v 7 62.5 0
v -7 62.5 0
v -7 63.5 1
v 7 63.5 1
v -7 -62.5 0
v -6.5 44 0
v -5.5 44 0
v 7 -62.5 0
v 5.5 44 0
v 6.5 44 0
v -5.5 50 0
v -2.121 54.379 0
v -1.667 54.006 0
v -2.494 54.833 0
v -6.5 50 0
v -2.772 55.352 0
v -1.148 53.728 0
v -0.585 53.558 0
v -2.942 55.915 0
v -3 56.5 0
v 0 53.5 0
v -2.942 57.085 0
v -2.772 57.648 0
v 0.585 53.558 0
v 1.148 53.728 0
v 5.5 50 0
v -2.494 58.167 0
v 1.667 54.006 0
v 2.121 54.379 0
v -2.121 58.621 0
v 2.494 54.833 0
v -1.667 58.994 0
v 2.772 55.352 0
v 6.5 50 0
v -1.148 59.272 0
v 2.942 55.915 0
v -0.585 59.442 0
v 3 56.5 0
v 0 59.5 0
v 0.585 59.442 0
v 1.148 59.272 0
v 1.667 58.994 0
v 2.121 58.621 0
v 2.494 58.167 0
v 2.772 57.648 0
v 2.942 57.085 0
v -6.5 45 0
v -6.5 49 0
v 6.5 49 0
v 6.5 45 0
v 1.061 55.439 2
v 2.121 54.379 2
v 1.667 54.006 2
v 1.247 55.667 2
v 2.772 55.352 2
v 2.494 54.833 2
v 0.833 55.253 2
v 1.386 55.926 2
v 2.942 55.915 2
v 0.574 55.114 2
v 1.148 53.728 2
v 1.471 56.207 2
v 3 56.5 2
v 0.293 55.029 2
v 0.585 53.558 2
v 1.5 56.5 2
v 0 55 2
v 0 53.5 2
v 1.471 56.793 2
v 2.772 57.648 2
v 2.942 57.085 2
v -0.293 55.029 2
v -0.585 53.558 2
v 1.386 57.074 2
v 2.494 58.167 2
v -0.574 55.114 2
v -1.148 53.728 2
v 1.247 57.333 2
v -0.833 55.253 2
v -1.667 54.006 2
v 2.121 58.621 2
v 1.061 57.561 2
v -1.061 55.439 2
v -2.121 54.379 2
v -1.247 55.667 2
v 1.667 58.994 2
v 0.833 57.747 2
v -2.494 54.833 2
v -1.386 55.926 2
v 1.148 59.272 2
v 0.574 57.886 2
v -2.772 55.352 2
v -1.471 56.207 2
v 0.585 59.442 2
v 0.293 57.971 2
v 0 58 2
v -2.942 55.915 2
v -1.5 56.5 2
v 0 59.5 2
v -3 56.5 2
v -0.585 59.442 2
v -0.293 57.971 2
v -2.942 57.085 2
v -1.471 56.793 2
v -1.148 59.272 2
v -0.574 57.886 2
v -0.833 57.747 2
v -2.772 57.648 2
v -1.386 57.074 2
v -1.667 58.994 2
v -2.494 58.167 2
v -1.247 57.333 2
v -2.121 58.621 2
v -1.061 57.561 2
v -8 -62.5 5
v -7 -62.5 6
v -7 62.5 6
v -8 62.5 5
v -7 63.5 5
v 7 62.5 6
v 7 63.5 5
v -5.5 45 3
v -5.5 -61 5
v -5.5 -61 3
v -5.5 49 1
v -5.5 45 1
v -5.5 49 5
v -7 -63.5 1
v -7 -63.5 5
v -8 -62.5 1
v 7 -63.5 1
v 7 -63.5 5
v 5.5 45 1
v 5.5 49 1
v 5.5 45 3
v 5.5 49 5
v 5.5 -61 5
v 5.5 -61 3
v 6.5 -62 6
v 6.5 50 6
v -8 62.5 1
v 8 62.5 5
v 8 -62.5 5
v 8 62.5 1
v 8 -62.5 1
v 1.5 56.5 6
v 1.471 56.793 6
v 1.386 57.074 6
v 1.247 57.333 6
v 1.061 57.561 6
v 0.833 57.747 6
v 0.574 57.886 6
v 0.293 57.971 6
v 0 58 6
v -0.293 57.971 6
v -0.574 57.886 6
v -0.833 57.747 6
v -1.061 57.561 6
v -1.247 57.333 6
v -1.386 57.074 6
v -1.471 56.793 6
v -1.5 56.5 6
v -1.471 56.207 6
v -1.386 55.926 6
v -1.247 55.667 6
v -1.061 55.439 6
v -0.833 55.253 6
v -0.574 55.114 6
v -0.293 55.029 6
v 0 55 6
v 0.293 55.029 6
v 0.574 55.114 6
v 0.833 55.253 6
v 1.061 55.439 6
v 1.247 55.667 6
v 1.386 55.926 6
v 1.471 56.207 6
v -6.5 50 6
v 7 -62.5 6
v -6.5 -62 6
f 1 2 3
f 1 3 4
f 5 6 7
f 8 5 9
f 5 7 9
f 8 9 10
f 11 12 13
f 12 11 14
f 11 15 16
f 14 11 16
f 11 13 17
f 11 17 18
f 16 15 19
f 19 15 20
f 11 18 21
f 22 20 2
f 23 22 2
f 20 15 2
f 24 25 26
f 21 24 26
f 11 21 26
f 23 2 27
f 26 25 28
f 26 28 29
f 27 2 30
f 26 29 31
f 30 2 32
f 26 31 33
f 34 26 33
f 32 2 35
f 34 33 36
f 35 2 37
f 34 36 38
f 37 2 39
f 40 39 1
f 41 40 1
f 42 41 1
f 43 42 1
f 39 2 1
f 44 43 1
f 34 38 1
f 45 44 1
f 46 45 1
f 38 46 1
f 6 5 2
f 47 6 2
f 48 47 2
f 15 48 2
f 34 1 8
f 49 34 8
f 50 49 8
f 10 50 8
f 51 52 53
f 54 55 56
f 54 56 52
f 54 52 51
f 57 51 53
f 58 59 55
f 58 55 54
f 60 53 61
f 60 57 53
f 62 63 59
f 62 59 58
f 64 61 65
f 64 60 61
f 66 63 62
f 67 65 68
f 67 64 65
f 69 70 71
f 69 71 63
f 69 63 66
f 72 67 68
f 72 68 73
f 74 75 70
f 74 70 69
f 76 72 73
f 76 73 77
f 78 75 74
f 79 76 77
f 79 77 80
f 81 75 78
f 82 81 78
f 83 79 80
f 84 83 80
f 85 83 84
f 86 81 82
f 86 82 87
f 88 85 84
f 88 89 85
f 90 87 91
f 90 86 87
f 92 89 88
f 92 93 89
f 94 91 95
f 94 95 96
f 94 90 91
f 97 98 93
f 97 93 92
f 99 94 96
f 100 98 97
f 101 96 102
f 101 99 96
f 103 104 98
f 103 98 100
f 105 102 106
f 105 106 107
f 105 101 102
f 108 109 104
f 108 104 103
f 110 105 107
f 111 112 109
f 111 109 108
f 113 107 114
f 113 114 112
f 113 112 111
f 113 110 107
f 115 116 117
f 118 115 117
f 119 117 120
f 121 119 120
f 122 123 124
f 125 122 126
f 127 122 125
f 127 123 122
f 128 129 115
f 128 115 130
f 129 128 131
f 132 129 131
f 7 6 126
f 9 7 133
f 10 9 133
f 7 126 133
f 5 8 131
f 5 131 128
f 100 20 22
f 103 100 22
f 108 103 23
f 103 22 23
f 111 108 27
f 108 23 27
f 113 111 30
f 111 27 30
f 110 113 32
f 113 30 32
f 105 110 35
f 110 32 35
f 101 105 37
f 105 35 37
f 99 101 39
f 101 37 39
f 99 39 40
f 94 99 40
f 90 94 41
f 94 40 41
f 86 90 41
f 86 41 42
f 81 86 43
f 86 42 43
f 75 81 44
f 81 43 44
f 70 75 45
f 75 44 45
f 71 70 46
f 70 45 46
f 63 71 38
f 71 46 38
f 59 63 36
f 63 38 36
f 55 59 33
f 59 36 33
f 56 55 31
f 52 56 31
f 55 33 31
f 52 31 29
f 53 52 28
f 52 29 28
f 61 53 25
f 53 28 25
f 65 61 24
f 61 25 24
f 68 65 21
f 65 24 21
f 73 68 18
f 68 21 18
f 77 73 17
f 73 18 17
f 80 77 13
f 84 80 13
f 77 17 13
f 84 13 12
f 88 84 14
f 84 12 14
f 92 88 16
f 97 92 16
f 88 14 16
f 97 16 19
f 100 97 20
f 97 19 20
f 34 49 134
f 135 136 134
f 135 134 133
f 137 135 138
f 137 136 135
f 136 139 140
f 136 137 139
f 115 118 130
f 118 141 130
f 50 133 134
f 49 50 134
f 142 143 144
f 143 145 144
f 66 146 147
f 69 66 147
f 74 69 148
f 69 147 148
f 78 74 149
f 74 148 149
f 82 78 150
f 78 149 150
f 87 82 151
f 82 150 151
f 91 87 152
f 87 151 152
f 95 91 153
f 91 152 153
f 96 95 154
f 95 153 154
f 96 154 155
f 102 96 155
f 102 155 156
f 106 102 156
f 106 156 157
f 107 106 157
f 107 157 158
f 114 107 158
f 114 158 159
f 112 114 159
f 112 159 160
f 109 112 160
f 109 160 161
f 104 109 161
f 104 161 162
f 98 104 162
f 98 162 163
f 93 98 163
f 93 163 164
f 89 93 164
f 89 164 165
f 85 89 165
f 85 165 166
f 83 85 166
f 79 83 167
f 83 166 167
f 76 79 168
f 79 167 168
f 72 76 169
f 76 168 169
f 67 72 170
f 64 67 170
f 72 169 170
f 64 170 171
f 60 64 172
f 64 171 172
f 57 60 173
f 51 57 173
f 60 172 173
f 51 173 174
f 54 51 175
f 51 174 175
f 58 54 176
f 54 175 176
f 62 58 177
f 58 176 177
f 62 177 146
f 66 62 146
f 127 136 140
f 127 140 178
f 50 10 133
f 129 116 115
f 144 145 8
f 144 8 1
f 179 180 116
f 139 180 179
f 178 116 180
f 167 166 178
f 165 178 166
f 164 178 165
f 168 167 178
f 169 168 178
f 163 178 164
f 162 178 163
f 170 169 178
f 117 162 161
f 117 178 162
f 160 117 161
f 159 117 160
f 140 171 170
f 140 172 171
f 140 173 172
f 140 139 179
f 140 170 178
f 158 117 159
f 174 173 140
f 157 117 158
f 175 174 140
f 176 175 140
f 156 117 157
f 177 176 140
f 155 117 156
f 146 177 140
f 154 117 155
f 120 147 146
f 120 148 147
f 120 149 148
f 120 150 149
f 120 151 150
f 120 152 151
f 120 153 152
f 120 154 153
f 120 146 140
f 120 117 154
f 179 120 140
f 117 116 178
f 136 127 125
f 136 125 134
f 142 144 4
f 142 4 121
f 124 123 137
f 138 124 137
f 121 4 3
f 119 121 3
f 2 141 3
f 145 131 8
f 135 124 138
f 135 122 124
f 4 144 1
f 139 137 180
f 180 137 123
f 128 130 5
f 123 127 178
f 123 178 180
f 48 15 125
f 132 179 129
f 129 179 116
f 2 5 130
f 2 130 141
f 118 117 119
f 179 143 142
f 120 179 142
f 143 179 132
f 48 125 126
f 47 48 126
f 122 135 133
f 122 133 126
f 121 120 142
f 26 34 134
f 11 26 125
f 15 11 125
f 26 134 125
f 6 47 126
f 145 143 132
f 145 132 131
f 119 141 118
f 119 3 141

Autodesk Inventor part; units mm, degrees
ref_plane "YZ 平面" through (0, 0, 0) normal (1, 0, 0) x (0, 1, 0)
ref_plane "XZ 平面" through (0, 0, 0) normal (0, 1, 0) x (-1, 0, 0)
ref_plane "XY 平面" through (0, 0, 0) normal (0, 0, 1) x (1, 0, 0)
sketch "草圖1" plane through (0, 0, 0) normal (0, 0, 1) x (1, 0, 0)
  line L0 (-8, -63.5) -> (8, -63.5)
  line L1 (8, -63.5) -> (8, 63.5)
  line L2 (8, 63.5) -> (-8, 63.5)
  line L3 (-8, 63.5) -> (-8, -63.5)
  line L4 (-8, -63.5) -> (8, 63.5) construction
  line L5 (8, -63.5) -> (-8, 63.5) construction
  point P0 (0, 0)
  dimension "d0" = 16
  dimension "d1" = 127
extrude "擠出1" add sketch "草圖1" along normal blind 6
sketch "草圖2" plane through (0, 0, 6) normal (0, 0, 1) x (1, 0, 0)
  line L0 (-5.5, -61) -> (5.5, -61)
  line L1 (5.5, -61) -> (5.5, 49)
  line L2 (5.5, 49) -> (-5.5, 49)
  line L3 (-5.5, 49) -> (-5.5, -61)
  line L4 (-5.5, -61) -> (5.5, 49) construction
  line L5 (5.5, -61) -> (-5.5, 49) construction
  line L6 (-8, -63.5) -> (8, -63.5) projected
  line L7 (8, -63.5) -> (8, 63.5) projected
  point P0 (0, 0)
  point P1 (0, -6)
  dimension "d4" = 11
  dimension "d5" = 110
  dimension "d6" = 2.5
  dimension "d7" = 2.5
extrude "擠出2" cut sketch "草圖2" against normal blind 3
sketch "草圖3" plane through (0, 0, 3) normal (0, 0, 1) x (1, 0, 0)
  line L0 (-5.5, 49) -> (5.5, 49)
  line L1 (5.5, 49) -> (5.5, 45)
  line L2 (5.5, 45) -> (-5.5, 45)
  line L3 (-5.5, 45) -> (-5.5, 49)
  line L4 (-5.5, 49) -> (5.5, 45) construction
  line L5 (5.5, 49) -> (-5.5, 45) construction
  line L6 (-5.5, 49) -> (5.5, 49) projected
  line L7 (-5.5, -61) -> (-5.5, 49) projected
  point P0 (0, 0)
  point P1 (0, 47)
  dimension "d10" = 11
  dimension "d11" = 4
  dimension "d12" = 0
  dimension "d13" = 0
extrude "擠出3" cut sketch "草圖3" against normal blind 3
sketch "草圖4" plane through (0, 0, 6) normal (0, 0, 1) x (1, 0, 0)
  circle A0 centre (0, 56.5) radius 1.5
  line L0 (8, 63.5) -> (-8, 63.5) projected
  line L1 (-8, 63.5) -> (-8, -63.5) projected
  point P0 (0, 0)
  dimension "d16" = 7
  dimension "d17" = 8
  dimension "d18" = 3
extrude "擠出4" cut sketch "草圖4" against normal blind 6
chamfer "倒角1" distance 1 angle 45 16 edges at (-5.5, -6, 6) (-8, 0, 6) (8, 0, 6) (5.5, -6, 6) (0, 49, 6) (0, -61, 6) (0, -63.5, 6) (0, 63.5, 6) (8, 63.5, 3) (-8, 63.5, 3) (8, -63.5, 3) (-8, -63.5, 3) (-8, 0, 0) (0, -63.5, 0) (8, 0, 0) (0, 63.5, 0)
sketch "草圖5" plane through (0, 0, 0) normal (0, 0, -1) x (-1, 0, 0)
  circle A0 centre (0, 56.5) radius 3
  line L0 (7, 63.5) -> (-7, 63.5) projected
  line L1 (8, -62.5) -> (8, 62.5) projected
  point P0 (0, 0)
  dimension "d24" = 6
  dimension "d25" = 7
  dimension "d26" = 8
extrude "擠出5" cut sketch "草圖5" against normal blind 2
chamfer "倒角2" distance 1 angle 45 2 edges at (0, 45, 0) (0, 49, 0)
chamfer "倒角3" distance 1 angle 45 1 edges at (-5.5, 44.5, 0)
chamfer "倒角4" distance 1 angle 45 1 edges at (5.5, 44.5, 0)
properties part number "風力"
